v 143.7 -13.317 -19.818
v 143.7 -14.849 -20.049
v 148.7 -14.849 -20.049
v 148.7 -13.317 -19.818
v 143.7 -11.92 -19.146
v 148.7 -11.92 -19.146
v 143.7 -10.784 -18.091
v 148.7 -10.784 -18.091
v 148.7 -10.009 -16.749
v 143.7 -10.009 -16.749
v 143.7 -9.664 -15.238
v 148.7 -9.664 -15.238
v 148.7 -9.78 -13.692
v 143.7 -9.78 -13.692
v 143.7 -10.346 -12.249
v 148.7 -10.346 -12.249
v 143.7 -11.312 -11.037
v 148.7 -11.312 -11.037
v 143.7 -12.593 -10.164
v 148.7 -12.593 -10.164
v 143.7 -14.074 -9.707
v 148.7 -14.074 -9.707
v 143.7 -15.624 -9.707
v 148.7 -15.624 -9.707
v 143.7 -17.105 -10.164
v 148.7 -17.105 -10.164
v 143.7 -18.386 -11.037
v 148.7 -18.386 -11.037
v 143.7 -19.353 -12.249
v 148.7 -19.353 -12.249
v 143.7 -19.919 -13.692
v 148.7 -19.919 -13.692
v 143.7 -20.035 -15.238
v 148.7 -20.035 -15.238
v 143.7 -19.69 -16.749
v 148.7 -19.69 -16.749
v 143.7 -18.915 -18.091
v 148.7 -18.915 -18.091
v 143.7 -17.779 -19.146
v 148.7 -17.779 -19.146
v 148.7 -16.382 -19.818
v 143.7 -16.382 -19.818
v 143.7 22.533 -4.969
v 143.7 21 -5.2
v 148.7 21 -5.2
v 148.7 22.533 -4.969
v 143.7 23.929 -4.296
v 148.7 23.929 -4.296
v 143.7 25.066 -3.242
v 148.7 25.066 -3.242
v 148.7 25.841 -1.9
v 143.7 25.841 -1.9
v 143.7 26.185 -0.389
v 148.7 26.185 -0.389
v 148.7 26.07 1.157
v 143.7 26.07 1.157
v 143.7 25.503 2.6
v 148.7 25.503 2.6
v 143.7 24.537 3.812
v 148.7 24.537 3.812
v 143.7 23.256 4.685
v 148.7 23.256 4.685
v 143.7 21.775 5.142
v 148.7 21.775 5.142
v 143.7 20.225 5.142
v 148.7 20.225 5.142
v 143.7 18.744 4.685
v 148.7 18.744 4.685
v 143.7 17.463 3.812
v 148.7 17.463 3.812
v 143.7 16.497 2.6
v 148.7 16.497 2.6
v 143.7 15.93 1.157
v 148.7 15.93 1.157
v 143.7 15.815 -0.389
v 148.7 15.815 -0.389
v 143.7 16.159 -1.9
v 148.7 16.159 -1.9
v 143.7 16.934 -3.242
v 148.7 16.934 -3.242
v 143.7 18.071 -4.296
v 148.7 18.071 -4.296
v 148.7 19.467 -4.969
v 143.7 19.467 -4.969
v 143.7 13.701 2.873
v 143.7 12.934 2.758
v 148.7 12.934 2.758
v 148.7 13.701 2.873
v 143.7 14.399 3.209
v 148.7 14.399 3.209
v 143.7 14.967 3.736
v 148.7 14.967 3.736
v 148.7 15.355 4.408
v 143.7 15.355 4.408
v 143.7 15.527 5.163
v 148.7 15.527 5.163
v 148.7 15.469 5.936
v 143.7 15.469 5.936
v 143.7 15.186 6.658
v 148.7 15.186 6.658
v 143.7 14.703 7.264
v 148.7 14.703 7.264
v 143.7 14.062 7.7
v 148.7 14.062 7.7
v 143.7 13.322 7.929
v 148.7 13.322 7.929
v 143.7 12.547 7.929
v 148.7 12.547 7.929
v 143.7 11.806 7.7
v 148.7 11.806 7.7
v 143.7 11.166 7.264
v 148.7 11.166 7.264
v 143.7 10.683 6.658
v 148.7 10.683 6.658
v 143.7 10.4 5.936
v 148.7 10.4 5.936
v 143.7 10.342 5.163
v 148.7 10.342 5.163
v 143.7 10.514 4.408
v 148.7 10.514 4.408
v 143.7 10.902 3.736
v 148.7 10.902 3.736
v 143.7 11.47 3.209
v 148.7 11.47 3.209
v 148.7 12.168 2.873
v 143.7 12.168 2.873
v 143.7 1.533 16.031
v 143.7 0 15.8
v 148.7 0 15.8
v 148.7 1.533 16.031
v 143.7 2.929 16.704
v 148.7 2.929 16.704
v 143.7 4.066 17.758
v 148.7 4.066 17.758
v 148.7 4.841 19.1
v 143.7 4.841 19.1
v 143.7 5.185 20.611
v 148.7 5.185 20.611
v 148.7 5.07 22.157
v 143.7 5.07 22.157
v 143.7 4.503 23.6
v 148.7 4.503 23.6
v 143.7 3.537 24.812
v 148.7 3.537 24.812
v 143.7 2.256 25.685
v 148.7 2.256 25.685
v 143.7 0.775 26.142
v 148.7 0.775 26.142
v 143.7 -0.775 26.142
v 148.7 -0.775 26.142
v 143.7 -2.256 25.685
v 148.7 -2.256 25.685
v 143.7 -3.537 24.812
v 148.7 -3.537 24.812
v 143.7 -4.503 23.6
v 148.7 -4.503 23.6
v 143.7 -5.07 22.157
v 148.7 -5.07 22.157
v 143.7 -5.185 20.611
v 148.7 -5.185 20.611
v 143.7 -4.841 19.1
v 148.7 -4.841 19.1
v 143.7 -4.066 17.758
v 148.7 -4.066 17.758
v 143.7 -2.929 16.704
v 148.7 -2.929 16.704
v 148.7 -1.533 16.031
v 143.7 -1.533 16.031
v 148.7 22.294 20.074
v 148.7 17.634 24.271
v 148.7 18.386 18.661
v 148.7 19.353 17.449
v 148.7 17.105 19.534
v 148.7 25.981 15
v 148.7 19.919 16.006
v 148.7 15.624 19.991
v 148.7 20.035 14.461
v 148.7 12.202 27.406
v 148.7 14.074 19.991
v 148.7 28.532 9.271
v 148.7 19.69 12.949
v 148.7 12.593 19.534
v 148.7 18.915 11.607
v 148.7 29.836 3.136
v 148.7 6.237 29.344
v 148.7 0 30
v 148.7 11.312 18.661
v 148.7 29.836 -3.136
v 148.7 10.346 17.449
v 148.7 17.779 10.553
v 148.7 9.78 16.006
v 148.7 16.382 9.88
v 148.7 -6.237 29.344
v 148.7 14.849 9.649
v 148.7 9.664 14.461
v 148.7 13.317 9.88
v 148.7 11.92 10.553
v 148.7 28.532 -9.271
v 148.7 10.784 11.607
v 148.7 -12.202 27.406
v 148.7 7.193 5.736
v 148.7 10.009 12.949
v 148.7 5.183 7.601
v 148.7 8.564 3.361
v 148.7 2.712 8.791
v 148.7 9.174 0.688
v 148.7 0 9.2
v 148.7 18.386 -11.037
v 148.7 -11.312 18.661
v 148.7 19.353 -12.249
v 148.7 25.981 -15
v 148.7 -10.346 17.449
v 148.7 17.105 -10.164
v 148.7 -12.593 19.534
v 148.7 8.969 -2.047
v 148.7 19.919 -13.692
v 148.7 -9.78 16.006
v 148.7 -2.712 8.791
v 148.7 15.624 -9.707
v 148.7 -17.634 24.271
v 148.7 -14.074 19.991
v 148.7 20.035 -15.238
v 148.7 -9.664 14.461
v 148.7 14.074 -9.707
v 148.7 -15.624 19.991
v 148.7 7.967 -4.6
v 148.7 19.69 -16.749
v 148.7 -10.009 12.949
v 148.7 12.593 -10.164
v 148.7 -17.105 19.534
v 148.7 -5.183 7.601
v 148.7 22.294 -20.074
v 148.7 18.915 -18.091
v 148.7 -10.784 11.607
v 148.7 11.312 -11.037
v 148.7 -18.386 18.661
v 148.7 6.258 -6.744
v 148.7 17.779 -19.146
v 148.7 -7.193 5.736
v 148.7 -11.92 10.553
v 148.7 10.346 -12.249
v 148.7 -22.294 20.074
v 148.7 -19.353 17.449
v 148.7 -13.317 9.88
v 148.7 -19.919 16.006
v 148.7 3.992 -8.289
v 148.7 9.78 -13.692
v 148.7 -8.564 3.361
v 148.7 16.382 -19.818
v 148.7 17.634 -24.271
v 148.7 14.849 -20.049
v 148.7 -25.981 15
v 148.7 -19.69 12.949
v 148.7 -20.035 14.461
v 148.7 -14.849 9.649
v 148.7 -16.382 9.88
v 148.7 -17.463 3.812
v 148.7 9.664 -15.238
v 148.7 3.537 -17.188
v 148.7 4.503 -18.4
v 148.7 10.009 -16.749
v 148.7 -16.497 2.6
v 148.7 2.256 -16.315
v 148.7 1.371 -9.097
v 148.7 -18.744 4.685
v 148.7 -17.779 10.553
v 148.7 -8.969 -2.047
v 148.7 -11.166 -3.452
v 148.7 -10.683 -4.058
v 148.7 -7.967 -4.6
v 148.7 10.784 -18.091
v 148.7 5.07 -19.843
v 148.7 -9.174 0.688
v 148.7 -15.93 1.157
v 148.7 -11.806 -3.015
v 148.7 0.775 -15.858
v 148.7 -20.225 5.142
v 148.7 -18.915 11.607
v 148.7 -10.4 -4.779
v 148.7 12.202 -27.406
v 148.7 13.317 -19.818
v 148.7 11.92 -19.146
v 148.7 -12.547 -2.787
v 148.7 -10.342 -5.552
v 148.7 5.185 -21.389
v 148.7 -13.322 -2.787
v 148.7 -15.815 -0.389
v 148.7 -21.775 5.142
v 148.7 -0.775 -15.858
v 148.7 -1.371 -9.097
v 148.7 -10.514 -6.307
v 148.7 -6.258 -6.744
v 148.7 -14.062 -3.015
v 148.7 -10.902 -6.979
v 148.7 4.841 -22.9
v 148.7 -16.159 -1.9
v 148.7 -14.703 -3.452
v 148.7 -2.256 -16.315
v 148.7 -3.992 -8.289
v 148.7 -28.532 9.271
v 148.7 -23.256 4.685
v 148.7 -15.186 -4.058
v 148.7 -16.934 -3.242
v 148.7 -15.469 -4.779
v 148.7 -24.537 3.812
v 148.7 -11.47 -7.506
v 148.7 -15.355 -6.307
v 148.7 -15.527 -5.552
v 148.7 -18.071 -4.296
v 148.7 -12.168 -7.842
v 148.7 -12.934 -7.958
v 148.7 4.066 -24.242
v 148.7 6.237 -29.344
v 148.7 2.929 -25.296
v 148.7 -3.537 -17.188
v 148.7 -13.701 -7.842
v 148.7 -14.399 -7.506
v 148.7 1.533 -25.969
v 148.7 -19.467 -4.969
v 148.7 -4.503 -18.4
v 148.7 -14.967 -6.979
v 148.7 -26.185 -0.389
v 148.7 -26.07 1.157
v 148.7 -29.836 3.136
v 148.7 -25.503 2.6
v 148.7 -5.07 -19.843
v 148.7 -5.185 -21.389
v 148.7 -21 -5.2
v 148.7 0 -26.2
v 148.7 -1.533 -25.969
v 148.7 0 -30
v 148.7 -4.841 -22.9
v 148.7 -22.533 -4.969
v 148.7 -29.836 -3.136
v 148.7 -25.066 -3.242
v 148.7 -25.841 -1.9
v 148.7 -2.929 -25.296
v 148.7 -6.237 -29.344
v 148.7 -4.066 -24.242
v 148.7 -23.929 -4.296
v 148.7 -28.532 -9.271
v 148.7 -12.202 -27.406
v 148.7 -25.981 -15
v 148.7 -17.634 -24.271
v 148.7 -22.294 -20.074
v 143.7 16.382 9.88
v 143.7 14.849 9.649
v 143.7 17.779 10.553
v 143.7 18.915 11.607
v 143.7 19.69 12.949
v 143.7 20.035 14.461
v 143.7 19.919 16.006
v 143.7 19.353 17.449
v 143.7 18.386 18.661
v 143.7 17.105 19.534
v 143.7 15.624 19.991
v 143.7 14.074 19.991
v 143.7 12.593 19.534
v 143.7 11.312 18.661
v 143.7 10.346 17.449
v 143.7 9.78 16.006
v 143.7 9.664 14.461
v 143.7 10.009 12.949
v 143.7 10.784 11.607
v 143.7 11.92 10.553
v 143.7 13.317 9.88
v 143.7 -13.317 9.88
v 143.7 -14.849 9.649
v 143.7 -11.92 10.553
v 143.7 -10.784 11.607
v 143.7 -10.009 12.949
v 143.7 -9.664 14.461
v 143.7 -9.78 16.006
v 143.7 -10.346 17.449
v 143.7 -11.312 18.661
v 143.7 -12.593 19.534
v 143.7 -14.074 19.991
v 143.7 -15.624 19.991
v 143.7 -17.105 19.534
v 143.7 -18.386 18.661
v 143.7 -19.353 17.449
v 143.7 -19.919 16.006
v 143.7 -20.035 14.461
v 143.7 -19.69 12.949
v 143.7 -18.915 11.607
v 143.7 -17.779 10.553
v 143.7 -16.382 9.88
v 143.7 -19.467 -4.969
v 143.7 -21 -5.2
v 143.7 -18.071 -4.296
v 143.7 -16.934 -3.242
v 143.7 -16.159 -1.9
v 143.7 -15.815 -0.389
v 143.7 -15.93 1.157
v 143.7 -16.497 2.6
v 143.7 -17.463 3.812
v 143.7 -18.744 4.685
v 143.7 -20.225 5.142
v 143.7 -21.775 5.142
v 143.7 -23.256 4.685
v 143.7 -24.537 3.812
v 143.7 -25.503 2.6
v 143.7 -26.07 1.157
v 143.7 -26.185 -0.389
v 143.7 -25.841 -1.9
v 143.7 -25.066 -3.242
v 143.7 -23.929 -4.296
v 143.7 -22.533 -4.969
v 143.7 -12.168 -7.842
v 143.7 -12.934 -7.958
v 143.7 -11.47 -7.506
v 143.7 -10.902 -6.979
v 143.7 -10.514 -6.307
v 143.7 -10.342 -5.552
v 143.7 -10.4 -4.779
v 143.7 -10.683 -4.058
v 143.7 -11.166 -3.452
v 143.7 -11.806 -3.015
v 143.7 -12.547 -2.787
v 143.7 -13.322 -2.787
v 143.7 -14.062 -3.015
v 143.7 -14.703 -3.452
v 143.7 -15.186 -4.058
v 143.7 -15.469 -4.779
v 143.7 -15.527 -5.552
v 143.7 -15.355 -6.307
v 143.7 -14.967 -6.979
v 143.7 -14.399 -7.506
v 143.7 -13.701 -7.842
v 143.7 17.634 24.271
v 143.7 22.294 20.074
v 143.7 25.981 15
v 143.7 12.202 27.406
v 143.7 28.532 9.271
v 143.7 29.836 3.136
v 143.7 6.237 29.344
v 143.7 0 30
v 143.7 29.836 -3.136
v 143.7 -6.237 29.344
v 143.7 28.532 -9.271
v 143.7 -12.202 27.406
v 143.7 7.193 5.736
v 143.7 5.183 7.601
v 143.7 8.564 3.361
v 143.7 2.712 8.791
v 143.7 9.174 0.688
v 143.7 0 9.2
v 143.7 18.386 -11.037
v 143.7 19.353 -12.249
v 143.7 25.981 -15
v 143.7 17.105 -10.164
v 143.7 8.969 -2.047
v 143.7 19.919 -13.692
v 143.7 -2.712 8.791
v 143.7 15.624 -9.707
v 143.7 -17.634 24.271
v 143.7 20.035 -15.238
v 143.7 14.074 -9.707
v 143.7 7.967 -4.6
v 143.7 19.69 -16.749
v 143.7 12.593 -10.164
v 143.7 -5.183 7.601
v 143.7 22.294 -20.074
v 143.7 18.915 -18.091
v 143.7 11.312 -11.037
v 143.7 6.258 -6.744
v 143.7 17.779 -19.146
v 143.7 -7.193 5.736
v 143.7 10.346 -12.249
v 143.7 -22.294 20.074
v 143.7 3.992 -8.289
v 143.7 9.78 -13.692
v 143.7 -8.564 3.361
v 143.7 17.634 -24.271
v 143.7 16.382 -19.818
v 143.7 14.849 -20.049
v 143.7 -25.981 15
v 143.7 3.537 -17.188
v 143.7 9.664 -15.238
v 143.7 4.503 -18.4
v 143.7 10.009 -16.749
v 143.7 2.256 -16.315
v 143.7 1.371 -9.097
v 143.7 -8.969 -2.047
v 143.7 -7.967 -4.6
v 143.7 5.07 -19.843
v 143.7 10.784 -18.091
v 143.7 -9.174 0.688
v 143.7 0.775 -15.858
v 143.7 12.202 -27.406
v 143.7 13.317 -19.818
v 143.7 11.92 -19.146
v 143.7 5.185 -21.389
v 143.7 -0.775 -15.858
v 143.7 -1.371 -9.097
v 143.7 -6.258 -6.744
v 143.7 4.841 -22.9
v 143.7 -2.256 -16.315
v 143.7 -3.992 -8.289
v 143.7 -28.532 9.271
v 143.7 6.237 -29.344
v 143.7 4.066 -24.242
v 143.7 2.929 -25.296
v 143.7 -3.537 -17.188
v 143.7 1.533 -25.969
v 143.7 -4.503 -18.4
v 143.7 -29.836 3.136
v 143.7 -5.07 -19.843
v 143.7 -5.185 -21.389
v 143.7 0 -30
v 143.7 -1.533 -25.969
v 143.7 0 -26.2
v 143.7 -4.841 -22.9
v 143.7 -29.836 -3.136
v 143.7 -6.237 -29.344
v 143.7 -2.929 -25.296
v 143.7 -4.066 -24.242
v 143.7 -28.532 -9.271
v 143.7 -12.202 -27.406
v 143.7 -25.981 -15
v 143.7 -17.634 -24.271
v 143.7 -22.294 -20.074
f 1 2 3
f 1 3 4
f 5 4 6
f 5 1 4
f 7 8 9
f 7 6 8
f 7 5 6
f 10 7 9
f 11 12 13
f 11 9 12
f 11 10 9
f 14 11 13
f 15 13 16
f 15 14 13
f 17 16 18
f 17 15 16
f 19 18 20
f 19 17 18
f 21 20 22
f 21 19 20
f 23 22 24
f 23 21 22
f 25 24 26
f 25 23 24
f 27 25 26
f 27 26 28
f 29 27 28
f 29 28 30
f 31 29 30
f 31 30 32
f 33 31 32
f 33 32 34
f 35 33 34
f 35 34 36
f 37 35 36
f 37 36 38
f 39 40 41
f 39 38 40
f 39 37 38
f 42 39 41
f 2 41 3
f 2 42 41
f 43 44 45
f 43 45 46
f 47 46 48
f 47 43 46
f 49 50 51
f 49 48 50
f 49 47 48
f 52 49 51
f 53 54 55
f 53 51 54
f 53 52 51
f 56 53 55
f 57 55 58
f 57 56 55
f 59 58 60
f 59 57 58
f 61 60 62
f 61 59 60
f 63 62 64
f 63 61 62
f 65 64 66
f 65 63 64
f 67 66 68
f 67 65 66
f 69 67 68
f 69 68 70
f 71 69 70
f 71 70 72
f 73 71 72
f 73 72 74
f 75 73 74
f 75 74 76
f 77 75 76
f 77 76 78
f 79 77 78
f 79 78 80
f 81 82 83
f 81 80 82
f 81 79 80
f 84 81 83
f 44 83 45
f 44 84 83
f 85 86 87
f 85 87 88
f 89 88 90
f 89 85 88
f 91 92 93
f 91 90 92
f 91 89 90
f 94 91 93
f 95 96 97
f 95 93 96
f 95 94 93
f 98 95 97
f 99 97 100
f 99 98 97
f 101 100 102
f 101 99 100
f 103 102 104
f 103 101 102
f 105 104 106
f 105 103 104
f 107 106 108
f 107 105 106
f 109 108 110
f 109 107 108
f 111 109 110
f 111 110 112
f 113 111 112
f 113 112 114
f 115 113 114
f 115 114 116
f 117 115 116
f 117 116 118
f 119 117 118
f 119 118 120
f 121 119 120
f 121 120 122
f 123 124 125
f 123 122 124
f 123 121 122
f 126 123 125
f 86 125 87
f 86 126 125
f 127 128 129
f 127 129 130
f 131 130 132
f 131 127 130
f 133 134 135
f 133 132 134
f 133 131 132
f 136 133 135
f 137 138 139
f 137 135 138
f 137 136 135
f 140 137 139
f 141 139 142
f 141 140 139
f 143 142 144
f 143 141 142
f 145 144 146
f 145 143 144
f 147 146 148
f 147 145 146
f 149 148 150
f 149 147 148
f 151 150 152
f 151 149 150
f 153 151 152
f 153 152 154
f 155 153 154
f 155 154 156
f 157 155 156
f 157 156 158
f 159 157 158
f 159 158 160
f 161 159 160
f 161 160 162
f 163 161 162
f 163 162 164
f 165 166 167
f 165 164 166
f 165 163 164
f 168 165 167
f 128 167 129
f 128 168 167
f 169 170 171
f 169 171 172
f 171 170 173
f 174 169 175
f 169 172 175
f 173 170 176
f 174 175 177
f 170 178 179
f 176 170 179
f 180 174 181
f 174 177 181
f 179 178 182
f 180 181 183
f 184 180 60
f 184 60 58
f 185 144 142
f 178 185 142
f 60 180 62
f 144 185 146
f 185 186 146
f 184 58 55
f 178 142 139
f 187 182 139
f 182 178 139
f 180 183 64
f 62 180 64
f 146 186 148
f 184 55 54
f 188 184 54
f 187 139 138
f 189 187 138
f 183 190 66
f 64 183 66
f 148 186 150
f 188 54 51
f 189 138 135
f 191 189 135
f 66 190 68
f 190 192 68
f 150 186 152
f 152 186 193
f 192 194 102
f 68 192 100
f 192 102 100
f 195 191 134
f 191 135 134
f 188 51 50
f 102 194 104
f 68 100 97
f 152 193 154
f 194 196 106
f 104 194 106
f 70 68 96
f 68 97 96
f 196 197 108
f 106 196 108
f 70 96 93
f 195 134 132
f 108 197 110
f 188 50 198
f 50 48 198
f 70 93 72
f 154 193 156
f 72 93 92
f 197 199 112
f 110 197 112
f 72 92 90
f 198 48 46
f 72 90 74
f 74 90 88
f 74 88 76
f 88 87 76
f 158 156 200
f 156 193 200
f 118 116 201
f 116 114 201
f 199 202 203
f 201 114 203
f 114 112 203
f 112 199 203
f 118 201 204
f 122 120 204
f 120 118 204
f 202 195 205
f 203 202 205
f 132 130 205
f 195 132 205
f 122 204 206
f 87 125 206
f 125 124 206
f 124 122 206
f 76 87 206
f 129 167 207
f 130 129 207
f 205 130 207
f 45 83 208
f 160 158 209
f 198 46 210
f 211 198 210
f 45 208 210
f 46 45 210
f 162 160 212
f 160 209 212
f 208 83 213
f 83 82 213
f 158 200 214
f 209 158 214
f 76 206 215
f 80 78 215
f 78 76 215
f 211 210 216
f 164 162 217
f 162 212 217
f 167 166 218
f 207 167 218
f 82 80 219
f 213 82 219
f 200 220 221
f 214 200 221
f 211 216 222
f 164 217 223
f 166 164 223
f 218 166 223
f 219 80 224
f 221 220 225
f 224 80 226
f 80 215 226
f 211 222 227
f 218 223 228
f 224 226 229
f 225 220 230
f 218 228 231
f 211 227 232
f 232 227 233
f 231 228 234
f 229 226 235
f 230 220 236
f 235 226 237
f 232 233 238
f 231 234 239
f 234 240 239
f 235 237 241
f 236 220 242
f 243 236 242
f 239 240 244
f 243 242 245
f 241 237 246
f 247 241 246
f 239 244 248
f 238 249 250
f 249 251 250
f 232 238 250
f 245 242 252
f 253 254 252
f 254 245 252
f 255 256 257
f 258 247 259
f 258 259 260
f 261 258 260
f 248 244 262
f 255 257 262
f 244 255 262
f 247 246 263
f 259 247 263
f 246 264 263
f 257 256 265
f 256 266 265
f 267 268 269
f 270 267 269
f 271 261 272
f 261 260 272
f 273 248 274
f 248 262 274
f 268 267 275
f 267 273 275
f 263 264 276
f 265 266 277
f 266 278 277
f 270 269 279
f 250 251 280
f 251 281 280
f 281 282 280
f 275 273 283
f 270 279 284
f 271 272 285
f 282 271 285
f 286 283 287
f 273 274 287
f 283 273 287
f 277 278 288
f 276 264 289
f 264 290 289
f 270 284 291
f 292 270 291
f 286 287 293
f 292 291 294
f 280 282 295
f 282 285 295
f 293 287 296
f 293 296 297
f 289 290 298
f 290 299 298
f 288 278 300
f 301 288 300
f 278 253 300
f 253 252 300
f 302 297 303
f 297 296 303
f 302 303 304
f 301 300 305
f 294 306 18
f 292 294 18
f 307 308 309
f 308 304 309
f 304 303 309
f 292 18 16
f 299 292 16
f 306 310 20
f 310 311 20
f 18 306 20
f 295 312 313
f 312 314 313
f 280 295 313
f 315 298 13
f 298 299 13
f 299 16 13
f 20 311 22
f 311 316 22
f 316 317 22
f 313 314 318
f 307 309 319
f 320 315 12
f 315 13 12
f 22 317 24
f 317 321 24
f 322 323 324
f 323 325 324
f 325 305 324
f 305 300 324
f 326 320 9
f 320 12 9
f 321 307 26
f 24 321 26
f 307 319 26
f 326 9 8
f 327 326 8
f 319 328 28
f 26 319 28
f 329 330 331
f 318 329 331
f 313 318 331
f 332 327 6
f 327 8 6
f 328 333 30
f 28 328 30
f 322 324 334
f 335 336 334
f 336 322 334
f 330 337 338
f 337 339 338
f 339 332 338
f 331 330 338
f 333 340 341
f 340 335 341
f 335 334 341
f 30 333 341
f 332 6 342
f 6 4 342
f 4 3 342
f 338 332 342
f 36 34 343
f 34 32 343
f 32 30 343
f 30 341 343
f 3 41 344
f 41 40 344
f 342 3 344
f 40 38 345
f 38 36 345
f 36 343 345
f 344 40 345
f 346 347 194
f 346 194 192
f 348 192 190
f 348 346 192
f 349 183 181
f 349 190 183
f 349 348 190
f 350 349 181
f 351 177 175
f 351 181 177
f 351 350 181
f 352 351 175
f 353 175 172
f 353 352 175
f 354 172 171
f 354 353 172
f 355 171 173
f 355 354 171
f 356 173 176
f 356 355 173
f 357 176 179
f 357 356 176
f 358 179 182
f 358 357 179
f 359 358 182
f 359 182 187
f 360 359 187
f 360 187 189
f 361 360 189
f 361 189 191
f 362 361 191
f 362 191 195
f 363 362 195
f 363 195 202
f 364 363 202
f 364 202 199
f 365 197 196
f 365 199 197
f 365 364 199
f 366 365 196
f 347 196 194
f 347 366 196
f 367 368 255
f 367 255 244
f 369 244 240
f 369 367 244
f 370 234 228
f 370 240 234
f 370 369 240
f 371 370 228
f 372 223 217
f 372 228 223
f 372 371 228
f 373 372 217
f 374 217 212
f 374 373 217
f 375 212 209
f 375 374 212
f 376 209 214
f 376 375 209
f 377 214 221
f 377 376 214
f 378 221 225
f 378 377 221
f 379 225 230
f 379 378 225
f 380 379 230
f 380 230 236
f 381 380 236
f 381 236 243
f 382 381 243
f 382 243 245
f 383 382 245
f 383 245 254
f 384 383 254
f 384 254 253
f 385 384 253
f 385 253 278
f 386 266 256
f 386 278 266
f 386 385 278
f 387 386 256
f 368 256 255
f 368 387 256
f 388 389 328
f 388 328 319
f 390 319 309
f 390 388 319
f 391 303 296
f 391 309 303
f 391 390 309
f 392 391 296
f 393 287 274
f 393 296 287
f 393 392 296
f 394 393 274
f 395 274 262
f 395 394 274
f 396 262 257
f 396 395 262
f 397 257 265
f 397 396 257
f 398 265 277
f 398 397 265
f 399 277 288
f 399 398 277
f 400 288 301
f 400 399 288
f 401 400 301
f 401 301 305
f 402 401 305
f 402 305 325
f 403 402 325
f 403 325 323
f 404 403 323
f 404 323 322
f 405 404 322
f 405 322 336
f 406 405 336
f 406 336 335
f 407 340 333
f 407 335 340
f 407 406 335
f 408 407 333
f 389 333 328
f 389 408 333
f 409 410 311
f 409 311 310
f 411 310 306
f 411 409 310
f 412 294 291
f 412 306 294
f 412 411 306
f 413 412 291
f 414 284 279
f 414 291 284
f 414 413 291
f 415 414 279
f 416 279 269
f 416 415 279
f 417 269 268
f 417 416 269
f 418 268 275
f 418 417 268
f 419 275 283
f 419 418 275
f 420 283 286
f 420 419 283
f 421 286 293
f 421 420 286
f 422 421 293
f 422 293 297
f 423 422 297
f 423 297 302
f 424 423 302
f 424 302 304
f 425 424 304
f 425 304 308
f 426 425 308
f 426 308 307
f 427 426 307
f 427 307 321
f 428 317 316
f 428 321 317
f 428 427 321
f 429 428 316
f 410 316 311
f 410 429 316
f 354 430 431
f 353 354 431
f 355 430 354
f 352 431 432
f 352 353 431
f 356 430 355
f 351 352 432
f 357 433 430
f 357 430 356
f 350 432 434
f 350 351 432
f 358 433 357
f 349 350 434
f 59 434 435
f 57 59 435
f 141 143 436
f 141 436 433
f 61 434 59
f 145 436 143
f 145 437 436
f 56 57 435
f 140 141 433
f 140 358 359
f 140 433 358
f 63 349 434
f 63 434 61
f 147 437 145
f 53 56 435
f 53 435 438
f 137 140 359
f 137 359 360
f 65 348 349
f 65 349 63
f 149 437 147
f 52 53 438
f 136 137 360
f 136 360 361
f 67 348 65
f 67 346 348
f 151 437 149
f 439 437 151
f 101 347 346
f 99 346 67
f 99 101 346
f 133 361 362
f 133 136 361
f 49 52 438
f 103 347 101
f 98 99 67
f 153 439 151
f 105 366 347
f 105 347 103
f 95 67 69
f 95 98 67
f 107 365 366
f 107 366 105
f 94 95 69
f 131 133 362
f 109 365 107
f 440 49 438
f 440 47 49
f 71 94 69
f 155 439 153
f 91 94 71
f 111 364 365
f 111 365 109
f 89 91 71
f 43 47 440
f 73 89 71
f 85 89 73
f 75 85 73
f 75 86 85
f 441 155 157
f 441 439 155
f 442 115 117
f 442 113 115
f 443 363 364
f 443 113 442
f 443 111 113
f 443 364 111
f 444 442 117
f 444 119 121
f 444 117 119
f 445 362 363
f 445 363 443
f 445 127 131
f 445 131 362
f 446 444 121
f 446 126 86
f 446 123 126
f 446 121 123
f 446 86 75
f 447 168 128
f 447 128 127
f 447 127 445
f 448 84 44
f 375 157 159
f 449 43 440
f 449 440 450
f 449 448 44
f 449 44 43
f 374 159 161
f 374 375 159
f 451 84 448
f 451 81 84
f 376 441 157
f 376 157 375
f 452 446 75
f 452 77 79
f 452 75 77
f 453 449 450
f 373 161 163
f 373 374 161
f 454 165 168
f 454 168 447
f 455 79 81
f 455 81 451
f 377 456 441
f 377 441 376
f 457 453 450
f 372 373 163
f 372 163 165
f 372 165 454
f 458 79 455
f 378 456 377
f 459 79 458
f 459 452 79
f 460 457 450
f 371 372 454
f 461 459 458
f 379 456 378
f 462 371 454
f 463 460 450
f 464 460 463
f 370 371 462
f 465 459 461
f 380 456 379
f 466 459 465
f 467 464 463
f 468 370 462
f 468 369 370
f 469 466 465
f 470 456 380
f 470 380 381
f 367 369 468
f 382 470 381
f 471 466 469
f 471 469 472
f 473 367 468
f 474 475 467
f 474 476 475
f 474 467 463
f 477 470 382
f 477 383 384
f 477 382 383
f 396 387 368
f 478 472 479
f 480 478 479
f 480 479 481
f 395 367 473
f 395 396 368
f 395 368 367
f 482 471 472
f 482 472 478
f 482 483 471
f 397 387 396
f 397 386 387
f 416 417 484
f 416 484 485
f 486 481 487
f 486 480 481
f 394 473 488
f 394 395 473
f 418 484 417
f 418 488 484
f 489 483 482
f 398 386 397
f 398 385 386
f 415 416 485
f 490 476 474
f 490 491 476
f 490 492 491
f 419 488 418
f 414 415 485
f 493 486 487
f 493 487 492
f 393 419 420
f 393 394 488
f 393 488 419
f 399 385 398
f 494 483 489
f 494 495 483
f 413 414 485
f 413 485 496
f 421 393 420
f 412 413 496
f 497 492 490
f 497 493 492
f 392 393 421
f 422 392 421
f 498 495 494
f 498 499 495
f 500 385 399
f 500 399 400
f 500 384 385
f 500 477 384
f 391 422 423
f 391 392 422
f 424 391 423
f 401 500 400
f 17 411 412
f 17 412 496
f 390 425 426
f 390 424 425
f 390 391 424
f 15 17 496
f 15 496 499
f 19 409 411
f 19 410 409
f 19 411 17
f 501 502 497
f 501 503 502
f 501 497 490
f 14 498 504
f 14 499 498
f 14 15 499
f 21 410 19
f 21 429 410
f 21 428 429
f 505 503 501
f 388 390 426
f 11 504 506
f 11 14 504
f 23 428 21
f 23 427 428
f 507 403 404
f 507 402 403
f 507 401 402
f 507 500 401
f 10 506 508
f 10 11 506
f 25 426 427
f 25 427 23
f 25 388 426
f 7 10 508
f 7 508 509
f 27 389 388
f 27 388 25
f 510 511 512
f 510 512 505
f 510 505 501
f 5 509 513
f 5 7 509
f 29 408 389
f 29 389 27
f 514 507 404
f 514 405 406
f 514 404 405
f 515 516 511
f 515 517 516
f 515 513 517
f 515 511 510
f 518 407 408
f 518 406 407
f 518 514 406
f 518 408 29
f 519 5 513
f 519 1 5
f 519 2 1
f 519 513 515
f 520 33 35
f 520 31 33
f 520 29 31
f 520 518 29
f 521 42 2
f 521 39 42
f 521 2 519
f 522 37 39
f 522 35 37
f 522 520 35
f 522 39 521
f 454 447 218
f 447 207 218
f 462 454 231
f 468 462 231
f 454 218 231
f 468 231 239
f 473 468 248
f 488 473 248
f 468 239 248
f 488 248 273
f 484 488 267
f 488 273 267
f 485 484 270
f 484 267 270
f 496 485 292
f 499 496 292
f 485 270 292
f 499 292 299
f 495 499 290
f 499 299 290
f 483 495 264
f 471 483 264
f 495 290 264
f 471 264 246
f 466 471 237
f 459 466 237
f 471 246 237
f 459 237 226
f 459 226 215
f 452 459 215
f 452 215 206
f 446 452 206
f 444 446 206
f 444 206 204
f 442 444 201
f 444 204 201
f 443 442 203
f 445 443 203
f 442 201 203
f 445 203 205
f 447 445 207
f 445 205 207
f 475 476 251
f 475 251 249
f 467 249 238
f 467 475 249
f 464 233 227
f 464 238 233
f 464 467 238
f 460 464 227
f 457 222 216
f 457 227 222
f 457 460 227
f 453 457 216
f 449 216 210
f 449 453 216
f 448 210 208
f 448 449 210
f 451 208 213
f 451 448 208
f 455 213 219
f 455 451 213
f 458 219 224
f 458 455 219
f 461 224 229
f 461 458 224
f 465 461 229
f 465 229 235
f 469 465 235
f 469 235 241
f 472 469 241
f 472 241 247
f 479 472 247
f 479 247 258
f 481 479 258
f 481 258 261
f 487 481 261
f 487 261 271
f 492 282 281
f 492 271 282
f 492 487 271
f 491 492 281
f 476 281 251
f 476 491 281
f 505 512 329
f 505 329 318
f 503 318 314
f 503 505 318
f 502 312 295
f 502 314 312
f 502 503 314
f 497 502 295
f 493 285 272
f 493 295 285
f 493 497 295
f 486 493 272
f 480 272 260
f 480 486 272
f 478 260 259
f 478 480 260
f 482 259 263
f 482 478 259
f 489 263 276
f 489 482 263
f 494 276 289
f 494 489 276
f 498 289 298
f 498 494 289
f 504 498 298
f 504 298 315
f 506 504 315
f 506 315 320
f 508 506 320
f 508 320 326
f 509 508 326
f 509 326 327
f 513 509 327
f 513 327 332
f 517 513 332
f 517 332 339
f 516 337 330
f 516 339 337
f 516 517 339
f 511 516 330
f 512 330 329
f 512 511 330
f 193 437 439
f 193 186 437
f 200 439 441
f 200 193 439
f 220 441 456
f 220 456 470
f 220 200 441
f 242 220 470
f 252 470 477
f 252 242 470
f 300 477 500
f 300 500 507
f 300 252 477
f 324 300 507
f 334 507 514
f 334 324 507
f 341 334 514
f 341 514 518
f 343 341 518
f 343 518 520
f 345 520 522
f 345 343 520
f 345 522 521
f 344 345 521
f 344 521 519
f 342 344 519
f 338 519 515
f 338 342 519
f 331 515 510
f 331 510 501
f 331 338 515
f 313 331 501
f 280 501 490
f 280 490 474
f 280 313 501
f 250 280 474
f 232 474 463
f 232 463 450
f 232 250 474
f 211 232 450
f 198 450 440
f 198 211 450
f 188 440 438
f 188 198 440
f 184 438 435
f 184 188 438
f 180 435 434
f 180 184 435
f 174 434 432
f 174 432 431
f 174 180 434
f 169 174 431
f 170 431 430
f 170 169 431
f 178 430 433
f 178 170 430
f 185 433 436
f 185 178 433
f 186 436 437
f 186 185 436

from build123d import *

# Parameters (mm, degrees)
AXIAL_PROFILE_MM_W     = 5
AXIAL_PROFILE_MM_H     = 20.8
AXIAL_HOLES_DEPTH      = 155.634051877
AXIAL_HOLES_DEPTH_BACK = 155.634051877
SKETCH2_R              = 5.2
SKETCH2_R_2            = 2.6


with BuildPart() as part:
    # Axial profile (mm) → Full revolution (revolve)
    with BuildSketch(Plane.XY, mode=Mode.PRIVATE) as full_revolution_sk:
        with Locations((146.2, 19.6)):
            Rectangle(AXIAL_PROFILE_MM_W, AXIAL_PROFILE_MM_H)
    revolve(full_revolution_sk.sketch.rotate(Axis((-110, 0, 0), (1, 0, 0)), 90), axis=Axis((-110, 0, 0), (1, 0, 0)))

    # Sketch2 → Axial holes (cut, two sides: drawn at the far end of the back side and taken through both)
    with BuildSketch(Plane(origin=(0, 0, 0), x_dir=(0, 0, -1), z_dir=(1, 0, 0)).offset(-AXIAL_HOLES_DEPTH_BACK)):
        with Locations((0, 21)):
            Circle(SKETCH2_R)
        with Locations((-14.849242405, 14.849242405)):
            Circle(SKETCH2_R)
        with Locations((-21, 0)):
            Circle(SKETCH2_R)
        with Locations((-14.849242405, -14.849242405)):
            Circle(SKETCH2_R)
        with Locations((0, -21)):
            Circle(SKETCH2_R)
        with Locations((14.849242405, -14.849242405)):
            Circle(SKETCH2_R)
        with Locations((21, 0)):
            Circle(SKETCH2_R)
        with Locations((14.849242405, 14.849242405)):
            Circle(SKETCH2_R)
        with Locations((-5.357568053, 12.934313455)):
            Circle(SKETCH2_R_2)
        with Locations((5.357568053, -12.934313455)):
            Circle(SKETCH2_R_2)
    extrude(amount=AXIAL_HOLES_DEPTH + AXIAL_HOLES_DEPTH_BACK, mode=Mode.SUBTRACT)


solid = part.part
